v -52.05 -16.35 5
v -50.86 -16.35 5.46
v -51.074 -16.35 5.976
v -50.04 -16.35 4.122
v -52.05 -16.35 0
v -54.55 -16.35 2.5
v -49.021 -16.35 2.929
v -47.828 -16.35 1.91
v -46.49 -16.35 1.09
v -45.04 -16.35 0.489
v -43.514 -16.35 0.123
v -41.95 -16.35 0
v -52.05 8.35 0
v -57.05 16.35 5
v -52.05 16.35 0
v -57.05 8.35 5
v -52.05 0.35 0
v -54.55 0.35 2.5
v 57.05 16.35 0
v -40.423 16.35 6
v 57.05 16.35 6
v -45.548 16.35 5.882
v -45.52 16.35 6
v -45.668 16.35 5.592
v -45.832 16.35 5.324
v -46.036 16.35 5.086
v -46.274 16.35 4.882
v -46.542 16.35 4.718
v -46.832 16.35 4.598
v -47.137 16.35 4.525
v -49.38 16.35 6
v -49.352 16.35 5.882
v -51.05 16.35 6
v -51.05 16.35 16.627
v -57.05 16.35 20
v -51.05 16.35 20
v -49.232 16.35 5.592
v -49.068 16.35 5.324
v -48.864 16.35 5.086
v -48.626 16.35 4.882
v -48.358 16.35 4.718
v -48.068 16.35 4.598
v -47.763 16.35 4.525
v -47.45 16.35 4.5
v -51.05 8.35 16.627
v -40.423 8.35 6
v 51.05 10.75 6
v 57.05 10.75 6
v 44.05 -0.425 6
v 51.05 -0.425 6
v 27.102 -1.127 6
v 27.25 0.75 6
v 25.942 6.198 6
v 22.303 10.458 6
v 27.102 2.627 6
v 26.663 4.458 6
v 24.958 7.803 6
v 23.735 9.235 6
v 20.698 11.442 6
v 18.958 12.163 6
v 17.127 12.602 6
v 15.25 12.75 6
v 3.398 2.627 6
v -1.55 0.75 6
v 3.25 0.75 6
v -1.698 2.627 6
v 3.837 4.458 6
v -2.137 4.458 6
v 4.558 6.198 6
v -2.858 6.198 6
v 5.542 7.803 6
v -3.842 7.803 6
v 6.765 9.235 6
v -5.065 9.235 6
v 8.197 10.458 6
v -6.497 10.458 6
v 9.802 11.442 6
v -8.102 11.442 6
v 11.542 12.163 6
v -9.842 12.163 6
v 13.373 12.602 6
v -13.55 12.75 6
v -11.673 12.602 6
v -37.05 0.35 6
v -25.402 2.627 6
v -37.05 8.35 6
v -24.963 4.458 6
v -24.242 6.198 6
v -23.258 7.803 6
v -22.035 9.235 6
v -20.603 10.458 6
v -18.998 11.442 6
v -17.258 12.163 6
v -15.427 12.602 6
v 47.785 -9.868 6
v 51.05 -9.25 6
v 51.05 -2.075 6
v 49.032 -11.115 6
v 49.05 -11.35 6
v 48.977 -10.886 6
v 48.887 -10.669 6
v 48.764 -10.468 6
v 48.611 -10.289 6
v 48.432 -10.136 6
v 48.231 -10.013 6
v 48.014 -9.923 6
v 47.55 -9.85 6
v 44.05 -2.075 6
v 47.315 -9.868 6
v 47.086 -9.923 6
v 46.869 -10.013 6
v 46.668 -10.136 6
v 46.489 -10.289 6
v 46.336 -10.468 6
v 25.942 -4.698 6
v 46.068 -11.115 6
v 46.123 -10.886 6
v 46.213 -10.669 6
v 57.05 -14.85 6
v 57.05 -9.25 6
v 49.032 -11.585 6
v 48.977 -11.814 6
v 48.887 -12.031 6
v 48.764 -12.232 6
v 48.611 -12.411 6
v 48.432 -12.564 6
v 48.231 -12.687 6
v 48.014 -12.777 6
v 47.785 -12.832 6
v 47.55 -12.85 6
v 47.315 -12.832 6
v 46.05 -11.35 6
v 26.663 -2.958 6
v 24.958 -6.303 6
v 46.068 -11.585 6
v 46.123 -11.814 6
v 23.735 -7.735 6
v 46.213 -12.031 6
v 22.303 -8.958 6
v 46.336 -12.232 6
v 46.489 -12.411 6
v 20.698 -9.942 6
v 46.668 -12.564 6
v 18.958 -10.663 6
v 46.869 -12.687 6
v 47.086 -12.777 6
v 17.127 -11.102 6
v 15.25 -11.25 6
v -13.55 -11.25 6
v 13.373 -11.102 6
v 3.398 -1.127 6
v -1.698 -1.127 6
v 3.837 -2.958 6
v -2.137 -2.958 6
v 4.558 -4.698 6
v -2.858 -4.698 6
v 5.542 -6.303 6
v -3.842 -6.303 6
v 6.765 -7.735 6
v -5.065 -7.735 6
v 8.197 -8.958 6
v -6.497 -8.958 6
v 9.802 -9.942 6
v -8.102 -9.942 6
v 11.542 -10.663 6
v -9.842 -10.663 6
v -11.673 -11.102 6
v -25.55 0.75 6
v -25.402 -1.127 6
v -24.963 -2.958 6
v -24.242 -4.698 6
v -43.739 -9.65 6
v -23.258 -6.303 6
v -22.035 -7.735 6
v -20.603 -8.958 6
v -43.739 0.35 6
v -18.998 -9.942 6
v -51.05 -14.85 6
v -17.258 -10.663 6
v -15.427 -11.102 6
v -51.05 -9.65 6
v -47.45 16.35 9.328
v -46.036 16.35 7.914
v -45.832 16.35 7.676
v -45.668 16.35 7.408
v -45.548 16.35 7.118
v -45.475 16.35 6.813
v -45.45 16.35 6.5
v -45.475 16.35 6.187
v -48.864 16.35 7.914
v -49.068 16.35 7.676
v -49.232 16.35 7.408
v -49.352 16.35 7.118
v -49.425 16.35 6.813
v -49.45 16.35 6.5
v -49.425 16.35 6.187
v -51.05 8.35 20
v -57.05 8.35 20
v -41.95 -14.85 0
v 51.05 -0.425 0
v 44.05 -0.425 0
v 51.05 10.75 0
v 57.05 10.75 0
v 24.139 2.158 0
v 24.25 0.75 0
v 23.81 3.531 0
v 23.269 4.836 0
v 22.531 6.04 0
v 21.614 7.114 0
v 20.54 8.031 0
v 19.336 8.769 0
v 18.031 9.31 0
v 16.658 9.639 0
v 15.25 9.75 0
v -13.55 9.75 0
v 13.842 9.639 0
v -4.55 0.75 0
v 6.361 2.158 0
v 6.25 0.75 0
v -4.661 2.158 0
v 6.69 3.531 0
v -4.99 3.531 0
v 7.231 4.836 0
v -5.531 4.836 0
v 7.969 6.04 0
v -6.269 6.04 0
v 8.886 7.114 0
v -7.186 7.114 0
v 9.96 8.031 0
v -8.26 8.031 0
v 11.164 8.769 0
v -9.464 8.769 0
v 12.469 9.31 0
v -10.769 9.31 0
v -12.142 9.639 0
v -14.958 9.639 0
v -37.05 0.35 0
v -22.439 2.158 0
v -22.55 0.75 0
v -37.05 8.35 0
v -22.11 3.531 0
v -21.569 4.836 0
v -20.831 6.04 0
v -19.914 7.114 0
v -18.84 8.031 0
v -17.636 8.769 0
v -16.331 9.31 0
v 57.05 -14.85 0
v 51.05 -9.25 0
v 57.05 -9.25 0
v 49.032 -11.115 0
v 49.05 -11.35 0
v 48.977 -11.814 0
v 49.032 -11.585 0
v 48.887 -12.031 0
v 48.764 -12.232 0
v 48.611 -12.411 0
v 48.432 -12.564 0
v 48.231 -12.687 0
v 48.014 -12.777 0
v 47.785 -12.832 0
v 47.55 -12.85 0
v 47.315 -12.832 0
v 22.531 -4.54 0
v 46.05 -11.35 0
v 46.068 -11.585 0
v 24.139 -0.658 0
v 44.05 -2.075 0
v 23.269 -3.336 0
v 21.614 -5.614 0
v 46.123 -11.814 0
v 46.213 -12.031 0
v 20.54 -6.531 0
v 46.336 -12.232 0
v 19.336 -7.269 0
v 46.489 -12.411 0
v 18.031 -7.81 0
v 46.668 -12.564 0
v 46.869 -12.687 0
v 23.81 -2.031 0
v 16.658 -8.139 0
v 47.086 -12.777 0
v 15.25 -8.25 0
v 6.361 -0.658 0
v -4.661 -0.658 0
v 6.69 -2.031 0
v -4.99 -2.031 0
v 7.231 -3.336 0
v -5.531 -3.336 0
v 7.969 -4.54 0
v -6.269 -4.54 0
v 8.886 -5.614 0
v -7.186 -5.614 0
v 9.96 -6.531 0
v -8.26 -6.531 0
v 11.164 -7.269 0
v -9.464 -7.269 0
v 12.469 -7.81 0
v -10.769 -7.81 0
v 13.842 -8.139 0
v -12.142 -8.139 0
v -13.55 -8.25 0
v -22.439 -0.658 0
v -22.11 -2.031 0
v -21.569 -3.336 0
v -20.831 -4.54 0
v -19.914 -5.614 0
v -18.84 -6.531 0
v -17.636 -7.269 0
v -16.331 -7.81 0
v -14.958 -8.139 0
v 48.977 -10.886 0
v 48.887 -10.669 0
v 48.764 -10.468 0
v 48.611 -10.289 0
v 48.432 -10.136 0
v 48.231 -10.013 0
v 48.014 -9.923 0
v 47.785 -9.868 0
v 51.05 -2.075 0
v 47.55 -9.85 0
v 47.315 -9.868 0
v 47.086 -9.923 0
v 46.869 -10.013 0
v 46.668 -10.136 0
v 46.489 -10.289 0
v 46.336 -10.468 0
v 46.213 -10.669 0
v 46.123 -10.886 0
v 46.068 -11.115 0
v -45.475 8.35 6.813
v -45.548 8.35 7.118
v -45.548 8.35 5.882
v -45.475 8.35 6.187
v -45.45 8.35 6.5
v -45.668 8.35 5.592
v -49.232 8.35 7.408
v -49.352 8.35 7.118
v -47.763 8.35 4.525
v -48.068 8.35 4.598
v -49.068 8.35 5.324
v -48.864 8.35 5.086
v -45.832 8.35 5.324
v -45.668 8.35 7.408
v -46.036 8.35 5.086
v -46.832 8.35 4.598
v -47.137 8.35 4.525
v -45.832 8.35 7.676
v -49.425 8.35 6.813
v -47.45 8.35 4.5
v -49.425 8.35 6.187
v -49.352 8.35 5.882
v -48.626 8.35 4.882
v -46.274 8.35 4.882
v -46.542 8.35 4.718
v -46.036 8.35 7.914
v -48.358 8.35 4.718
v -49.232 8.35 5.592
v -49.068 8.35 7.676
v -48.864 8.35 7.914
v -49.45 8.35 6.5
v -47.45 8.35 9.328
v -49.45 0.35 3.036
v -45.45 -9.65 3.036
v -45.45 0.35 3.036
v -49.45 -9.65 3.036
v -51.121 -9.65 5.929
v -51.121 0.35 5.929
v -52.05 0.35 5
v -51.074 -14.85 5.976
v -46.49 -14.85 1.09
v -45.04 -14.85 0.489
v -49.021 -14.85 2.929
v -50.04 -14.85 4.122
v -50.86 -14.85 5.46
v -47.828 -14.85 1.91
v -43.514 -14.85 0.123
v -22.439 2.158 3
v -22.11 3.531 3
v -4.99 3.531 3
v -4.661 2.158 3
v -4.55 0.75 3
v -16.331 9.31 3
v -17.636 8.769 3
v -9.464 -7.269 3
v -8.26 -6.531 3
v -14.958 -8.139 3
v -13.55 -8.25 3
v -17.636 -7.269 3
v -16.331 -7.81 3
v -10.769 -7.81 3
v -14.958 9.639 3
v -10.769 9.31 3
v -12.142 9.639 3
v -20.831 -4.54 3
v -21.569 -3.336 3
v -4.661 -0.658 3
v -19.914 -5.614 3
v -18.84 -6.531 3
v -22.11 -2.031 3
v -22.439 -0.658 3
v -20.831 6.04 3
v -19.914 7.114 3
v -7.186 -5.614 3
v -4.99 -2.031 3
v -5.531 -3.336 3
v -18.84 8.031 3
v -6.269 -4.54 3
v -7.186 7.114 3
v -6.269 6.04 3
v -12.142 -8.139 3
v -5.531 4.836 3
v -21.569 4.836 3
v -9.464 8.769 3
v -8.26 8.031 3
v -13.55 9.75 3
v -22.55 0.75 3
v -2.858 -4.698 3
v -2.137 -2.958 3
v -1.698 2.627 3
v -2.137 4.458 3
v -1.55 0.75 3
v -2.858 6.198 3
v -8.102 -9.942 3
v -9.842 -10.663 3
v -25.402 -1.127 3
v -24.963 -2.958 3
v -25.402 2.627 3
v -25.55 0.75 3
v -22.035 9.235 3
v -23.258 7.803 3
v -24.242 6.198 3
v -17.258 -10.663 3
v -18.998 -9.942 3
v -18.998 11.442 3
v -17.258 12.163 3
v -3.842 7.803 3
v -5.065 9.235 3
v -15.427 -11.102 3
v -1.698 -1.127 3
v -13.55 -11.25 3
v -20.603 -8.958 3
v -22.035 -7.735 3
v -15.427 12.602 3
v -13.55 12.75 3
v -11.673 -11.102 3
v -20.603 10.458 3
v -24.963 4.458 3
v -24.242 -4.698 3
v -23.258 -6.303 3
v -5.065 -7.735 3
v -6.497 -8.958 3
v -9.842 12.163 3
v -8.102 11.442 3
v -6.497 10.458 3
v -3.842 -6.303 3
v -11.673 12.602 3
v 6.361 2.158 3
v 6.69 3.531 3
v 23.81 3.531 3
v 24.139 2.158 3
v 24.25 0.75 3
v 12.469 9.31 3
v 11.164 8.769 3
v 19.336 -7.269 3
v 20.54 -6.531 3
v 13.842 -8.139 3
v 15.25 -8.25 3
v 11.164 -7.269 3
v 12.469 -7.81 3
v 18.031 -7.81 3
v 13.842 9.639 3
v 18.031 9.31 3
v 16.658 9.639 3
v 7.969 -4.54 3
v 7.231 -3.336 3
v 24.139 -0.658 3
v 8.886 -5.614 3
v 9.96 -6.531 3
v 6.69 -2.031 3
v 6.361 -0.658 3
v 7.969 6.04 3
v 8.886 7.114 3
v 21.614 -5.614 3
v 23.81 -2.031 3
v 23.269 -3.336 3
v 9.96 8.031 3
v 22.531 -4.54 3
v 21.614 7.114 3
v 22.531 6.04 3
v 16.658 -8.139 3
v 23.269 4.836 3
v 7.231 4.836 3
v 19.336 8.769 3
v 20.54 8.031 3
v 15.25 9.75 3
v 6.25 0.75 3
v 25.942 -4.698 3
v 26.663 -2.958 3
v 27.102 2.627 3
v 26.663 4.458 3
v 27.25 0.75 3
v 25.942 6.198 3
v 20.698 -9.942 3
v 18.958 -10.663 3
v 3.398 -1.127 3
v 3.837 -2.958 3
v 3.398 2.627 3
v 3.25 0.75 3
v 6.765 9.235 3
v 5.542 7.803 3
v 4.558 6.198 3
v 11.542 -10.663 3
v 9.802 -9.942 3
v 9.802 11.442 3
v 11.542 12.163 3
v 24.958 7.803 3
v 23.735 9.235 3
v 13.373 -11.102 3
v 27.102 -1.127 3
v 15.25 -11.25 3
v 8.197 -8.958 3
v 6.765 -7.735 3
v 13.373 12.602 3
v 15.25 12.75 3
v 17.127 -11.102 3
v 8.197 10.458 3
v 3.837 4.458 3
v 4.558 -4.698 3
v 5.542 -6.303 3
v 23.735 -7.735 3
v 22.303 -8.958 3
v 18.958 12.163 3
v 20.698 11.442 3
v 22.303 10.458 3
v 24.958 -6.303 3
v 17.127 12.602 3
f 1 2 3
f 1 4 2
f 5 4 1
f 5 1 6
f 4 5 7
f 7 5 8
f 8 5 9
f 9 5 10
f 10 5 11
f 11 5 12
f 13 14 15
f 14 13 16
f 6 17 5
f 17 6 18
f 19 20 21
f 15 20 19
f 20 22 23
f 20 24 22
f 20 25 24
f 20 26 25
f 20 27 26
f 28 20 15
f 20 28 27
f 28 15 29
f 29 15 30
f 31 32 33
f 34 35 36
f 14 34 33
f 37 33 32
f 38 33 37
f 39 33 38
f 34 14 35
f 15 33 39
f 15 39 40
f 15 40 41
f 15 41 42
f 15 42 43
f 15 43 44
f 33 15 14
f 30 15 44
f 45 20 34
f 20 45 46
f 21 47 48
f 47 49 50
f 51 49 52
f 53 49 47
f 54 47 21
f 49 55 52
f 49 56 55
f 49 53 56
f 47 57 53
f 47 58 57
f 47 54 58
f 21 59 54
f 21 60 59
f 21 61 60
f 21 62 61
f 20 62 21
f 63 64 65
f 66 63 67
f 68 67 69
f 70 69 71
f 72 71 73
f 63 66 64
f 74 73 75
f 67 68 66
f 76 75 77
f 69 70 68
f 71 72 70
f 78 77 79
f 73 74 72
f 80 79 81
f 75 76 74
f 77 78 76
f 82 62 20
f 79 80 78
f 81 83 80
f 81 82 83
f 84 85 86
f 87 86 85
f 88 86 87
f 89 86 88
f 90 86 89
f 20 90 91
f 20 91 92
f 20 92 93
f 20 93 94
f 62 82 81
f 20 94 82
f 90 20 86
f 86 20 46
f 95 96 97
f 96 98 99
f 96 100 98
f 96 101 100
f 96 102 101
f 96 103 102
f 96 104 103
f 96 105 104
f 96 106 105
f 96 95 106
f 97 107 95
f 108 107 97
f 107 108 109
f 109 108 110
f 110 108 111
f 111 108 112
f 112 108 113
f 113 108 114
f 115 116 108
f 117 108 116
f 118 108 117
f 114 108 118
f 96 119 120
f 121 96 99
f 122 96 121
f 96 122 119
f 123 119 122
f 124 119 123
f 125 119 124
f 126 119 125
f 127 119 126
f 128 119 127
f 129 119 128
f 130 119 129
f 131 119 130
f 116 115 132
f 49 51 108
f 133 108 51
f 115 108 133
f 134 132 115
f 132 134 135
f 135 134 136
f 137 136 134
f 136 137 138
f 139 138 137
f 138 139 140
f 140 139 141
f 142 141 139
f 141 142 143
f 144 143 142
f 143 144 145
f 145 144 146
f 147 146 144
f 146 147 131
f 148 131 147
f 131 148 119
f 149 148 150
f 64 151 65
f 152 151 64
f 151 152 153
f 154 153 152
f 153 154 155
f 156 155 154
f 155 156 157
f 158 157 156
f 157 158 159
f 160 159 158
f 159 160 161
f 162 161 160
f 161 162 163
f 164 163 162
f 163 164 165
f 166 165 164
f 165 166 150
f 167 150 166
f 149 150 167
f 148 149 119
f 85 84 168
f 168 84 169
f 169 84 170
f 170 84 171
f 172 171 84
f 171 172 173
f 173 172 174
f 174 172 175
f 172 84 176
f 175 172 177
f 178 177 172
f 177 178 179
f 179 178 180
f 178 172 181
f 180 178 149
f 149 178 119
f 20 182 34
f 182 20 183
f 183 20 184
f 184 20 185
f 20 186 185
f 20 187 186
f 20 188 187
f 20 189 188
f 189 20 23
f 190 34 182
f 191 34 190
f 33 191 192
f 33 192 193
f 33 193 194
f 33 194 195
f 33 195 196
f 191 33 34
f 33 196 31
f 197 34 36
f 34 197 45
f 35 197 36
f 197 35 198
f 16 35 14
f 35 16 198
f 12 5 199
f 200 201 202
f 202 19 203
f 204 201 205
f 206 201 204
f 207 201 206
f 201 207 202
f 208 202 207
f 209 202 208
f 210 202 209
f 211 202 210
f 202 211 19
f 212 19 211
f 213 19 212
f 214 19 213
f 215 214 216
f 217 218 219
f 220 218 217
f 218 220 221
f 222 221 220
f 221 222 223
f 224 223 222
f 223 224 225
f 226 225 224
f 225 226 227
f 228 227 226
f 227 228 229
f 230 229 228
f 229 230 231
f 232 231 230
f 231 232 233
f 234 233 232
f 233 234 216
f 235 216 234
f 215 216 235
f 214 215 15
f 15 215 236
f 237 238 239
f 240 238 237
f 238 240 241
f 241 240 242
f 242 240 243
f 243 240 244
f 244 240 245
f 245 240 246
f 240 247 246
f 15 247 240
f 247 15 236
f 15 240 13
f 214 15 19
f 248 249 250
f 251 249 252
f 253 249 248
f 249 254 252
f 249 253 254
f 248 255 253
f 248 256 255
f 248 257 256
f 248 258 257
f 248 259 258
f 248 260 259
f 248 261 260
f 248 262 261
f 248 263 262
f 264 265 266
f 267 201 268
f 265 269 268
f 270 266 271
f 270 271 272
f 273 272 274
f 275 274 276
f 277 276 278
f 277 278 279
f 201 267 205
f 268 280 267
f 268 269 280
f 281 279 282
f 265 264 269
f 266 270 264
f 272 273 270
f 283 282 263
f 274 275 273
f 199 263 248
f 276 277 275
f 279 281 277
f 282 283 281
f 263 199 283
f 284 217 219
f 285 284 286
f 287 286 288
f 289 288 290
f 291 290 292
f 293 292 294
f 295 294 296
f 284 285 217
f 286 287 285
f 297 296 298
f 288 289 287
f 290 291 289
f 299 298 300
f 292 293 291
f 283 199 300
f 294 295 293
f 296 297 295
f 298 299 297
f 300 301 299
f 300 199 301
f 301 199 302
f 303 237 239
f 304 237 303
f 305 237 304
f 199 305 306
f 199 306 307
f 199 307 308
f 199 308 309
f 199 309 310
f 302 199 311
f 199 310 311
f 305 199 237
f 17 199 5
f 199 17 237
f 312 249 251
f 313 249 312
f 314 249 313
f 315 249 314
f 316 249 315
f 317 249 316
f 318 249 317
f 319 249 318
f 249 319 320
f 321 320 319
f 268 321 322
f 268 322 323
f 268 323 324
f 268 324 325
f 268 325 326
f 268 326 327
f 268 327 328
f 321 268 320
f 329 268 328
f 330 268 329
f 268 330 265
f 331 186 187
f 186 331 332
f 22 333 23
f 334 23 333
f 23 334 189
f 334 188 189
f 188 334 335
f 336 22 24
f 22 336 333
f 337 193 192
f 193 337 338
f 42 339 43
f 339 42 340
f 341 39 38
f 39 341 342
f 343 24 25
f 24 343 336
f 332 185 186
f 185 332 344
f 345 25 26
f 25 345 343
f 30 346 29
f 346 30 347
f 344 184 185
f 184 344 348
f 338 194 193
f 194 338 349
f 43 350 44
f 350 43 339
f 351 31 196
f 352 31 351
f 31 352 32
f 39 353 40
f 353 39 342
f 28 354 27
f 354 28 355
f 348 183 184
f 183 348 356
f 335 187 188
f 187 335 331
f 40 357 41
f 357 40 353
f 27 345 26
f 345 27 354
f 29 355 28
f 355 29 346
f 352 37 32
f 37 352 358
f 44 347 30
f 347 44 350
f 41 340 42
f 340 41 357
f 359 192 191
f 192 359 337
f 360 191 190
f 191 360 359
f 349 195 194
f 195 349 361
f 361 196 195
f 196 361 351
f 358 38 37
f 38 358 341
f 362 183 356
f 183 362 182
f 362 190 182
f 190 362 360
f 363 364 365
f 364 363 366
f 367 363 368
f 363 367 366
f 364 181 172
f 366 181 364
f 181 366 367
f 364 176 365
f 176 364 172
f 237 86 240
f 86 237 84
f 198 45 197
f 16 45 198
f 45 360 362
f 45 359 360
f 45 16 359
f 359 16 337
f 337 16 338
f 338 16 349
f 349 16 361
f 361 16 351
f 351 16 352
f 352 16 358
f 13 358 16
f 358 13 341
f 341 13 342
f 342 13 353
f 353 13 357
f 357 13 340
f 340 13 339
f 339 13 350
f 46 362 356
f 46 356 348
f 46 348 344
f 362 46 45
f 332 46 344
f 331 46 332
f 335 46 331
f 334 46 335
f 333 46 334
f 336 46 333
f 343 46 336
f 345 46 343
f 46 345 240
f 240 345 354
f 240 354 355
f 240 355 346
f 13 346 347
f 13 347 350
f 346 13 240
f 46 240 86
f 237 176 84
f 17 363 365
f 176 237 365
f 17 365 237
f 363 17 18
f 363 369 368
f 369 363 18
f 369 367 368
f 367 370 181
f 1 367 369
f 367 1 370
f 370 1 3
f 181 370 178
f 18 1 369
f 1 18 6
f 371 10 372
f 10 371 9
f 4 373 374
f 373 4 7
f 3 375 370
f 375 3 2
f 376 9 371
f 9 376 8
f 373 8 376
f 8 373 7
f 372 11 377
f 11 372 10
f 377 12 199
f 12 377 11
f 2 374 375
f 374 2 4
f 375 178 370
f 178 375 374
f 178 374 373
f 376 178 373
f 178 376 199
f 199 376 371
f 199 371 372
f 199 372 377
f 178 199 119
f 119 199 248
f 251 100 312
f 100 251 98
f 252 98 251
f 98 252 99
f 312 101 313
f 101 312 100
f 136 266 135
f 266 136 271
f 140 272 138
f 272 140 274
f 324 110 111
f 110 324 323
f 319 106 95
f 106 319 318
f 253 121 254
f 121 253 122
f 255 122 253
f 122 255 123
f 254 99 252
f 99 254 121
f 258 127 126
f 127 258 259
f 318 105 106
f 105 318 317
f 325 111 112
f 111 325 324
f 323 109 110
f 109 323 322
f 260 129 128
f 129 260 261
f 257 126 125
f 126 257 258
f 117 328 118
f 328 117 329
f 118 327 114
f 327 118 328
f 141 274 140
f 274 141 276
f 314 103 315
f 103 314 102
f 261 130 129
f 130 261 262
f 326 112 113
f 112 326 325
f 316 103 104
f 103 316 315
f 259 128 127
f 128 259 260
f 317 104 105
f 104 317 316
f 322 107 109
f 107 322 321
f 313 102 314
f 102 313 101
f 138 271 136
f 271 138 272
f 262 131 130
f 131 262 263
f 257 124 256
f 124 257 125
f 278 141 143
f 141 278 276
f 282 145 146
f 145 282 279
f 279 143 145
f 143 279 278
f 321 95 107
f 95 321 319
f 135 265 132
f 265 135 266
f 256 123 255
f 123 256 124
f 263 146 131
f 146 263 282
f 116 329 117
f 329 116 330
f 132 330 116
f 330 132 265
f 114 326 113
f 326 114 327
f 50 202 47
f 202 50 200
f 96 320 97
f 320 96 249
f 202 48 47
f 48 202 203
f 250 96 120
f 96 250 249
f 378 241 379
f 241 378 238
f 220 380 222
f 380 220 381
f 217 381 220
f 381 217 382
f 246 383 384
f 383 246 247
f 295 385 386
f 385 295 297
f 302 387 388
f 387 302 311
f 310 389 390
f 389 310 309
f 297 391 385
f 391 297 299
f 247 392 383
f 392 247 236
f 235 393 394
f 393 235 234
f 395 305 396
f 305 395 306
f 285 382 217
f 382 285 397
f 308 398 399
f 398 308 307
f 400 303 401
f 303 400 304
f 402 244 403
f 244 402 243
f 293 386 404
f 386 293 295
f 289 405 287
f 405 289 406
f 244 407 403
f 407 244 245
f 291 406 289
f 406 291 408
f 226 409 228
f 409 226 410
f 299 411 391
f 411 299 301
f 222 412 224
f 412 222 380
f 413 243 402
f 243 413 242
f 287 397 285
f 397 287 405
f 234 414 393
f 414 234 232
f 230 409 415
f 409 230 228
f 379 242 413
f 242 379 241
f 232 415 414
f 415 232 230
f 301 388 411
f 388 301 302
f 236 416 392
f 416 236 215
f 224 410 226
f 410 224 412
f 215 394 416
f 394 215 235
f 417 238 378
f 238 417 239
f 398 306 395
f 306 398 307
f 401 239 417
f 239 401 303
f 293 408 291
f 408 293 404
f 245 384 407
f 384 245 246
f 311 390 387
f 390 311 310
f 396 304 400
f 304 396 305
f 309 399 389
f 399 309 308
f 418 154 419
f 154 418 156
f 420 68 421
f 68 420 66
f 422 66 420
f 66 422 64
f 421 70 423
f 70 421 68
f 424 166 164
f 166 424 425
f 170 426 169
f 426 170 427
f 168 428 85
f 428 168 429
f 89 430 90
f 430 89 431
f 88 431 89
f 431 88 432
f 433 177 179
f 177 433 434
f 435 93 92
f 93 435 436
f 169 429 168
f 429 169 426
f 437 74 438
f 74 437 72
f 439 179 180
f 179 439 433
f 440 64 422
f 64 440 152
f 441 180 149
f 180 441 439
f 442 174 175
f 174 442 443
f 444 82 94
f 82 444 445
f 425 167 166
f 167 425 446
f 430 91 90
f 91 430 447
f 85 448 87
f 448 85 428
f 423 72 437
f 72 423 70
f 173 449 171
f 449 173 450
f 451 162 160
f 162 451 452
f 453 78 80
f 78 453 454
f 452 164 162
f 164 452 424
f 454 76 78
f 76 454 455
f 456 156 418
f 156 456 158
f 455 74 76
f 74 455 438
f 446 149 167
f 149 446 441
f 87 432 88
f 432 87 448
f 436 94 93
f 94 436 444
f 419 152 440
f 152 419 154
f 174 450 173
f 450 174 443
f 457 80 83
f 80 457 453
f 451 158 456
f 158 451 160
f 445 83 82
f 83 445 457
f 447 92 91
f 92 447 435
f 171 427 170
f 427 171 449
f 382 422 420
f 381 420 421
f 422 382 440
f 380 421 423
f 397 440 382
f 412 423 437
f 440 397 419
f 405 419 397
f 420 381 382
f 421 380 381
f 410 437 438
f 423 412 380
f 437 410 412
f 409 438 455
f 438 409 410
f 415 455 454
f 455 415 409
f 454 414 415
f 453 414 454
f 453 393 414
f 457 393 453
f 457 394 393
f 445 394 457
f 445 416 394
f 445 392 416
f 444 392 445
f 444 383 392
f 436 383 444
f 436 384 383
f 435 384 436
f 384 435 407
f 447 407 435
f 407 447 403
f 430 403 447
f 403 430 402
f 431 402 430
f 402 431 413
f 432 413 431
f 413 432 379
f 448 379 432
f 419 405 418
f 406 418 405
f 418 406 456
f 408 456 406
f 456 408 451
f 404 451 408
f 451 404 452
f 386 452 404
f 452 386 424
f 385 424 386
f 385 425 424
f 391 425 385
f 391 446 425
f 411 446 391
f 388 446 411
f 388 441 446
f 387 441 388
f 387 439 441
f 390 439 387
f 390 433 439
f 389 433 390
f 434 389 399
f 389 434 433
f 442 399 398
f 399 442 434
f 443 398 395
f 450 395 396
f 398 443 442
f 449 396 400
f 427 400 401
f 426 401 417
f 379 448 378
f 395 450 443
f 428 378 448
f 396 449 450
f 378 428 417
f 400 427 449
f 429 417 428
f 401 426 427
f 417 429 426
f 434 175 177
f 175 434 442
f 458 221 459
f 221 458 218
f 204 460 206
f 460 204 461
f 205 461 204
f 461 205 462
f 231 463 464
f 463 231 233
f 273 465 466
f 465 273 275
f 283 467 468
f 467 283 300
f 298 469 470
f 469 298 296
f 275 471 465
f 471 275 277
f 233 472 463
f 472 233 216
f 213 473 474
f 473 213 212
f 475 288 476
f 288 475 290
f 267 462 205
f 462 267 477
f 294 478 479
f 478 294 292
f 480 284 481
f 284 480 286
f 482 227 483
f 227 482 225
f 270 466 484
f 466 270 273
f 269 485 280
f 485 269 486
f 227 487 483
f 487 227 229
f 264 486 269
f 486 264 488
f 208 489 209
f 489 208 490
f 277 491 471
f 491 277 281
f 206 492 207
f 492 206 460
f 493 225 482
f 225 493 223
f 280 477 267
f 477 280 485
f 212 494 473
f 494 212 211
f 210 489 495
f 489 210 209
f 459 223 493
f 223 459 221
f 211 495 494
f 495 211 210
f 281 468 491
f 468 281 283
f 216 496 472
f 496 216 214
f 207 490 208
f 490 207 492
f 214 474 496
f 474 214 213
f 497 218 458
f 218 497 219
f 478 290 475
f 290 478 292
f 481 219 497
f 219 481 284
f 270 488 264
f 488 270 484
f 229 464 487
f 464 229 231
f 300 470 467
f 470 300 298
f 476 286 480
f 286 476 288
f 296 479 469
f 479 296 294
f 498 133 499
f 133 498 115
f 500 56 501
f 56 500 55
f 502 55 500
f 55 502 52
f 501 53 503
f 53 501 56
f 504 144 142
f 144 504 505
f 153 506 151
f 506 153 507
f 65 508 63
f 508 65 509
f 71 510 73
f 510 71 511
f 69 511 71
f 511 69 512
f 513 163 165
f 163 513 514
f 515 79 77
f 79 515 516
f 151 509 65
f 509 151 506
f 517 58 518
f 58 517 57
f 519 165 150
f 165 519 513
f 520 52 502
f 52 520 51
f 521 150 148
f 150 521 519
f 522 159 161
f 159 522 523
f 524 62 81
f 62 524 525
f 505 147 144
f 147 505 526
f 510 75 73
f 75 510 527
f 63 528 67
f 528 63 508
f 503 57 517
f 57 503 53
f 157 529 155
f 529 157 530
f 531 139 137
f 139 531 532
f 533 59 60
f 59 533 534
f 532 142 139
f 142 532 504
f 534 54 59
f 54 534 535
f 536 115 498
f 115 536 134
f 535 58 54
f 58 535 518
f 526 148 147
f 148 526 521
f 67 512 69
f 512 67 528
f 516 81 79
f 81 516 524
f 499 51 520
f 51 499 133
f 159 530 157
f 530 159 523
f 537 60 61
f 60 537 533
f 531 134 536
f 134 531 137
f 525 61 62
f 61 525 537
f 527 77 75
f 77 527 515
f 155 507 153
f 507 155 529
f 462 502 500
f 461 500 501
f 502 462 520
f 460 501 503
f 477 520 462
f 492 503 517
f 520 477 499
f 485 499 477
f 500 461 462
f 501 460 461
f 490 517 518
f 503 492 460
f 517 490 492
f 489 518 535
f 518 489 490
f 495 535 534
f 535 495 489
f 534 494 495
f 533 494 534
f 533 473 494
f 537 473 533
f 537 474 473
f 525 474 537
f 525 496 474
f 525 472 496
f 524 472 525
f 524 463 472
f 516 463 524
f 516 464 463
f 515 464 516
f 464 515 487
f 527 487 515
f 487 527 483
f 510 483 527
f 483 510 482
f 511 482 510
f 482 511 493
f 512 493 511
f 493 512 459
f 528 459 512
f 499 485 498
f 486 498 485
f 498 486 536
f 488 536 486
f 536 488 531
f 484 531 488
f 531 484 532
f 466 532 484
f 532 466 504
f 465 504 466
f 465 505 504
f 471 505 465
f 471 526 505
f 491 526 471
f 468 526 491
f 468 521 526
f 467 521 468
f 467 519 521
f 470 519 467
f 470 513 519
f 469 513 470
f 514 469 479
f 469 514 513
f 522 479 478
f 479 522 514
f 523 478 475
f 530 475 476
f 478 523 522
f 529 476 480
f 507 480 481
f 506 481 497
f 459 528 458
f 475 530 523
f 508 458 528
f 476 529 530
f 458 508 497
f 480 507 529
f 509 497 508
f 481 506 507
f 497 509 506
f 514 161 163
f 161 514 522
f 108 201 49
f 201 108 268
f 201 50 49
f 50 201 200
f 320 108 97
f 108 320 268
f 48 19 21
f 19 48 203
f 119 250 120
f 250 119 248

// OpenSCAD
// file: _ittybox.scad
include <_constants.scad>

module panel(wall_thickness, side=false) {
	bolt_x = side ? bolt_offset_y : bolt_offset_x;
	bolt_z = side ? bolt_offset_x : bolt_offset_y;
	width = side ? panel_depth : panel_width;
	overlap_cutout_potition = side ? end_corner_height : -end_corner_height;
	overlap_cutout_size = side ? end_corner_height*2 : end_corner_height;

	difference() {
		union() {
			// Main panel
			translate([0, 0, wall_thickness/2]) {
				cube([width - corner_radius*2, height, wall_thickness], center=true);
			}

			for (x = [-1, 1]) {
				// Rounded corner
				translate([x*(width/2 - corner_radius), 0, corner_radius]) {
					r = corner_radius;
					rotate([90, 0, 0]) {
						intersection() {
							cylinder(height, r=r, center=true, $fn=4);
							mirror([x > 0 ? 1 : 0, 0, 0]) translate([0, 0, -height/2]) {
								linear_extrude(height=height) polygon([[-r, r], [-r, -r], [r, -r]]);
							}
						}
					}
				}
				overlap_length = corner_overlap - corner_radius;

				// Overlap side
				translate([x*(width/2 - wall_thickness/2), 0, corner_radius + overlap_length/2]) {
					cube([wall_thickness, height, overlap_length], center=true);
				}

				// Corner chamfer
				translate([x*(width/2), height/2 - end_corner_height*2, 0]) {
					mirror([x > 0 ? 1 : 0, 0, 0])
					intersection() {
						rotate([0, 45, 0]) cube([corner_chamfer*2, height*2, corner_chamfer*2], center=true);
						translate([wall_thickness, 0, wall_thickness]) {
							cube([width/2, end_corner_height*2, corner_overlap - wall_thickness], center=false);
						}
					}
				}
			}

			if (side) {
				// Plexi support
				support_height = (panel_width - plexi_width)/2 + 4;
				support_depth = plexi_thickness + 5;
				translate([0, -height/2 + plexi_thickness/2, support_height/2]) {
					cube([width - corner_radius*2, support_depth, support_height], center=true);
				}
			}
		}

		for (x = [-1, 1]) {
			// Bolt hole
			translate([x*(width/2 - bolt_x), height/2 - end_corner_height*2, bolt_z]) {
				rotate([-90, 0, 0]) cylinder(height, d=bolt_diameter, center=false);
				rotate([0, -45, 0]) cube([bolt_diameter/2, height, bolt_diameter/2], center=false);
				bolt_depression = bolt_nut_thickness/2;
				rotate([90, 0, 0]) cylinder(bolt_nut_clearance, d=bolt_nut_width, center=false, $fn=6);
				mirror([0, 1, 0]) translate([-bolt_nut_width/2, 0, 0]) cube([bolt_nut_width, bolt_nut_clearance, bolt_nut_width], center=false);
			}

			// Overlap cutout
			translate([x*(width/2), height/2 + overlap_cutout_potition - overlap_cutout_size/2, 0]) {
				cube([corner_overlap*2, overlap_cutout_size, corner_overlap*4], center=true);
			}

			// Diagonal corner cut
			translate([x*(width/2), height/2 - end_corner_height*2, 0]) {
				mirror([0, 1, 0]) rotate([0, -45, 0]) cube([width, height, width], center=false);
			}
		}
	}
}

module plexi_hole() {
	hull() {
		translate([
			-plexi_width/2 + plexi_hole_offset_x + plexi_hole_diameter/2,
			-plexi_depth/2 + plexi_hole_offset_y + plexi_hole_diameter/2,
			0,
		]) {
			cylinder(plexi_thickness*2, d=plexi_hole_diameter, center=true);
			translate([0, plexi_hole_length - plexi_hole_diameter, 0]) cylinder(plexi_thickness*2, d=plexi_hole_diameter, center=true);
		}
	}
}

module plexi() {
	difference() {
		translate([0, 0, plexi_thickness/2]) {
			minkowski() {
				cube([
					plexi_width - plexi_corner_radius*2,
					plexi_depth - plexi_corner_radius*2,
					plexi_thickness/2,
				], center=true);
				cylinder(plexi_thickness/2, r=plexi_corner_radius, center=true);
			}
		}
		// plexi_hole();
		// mirror([0, 1, 0]) plexi_hole();
		// mirror([1, 0, 0]) plexi_hole();
		// rotate([0, 0, 180]) plexi_hole();
	}
}

module end_panel(wall_thickness) {
	difference() {
		panel(wall_thickness, side=false);
		translate([0, -height/2, panel_depth/2]) rotate([-90, 0, 0]) plexi();
	}
}

module side_panel(wall_thickness) {
	difference() {
		panel(wall_thickness, side=true);
		translate([0, -height/2, panel_width/2]) rotate([-90, 90, 0]) plexi();
	}
}

module button_hole() {
	cylinder(button_panel_thickness*3, d=button_diameter, center=true);
	translate([0, 0, button_panel_thickness])
		cylinder(button_panel_thickness*2, d=button_tab_diameter, center=false);
}

module back_panel() {
	wall_thickness = 6;
	difference() {
		end_panel(wall_thickness);

		// USB port panel
		translate([0, height/2 - usb_panel_board_pos_y, 0]) {
			cube([usb_panel_width, usb_panel_board_thickness, wall_thickness*3], center=true);
		}
		translate([0, height/2 - usb_panel_height/2, 0]) {
			cube([usb_panel_inner_width, usb_panel_inner_height, wall_thickness*3], center=true);
			screw_x = usb_panel_width/2 - usb_panel_hole_offset;
			screw_y = usb_panel_height/2 - usb_panel_hole_offset;
			for (xy = [ [screw_x, screw_y], [-screw_x, -screw_y] ]) {
				translate([each xy, 0]) {
					cylinder(wall_thickness*3, d=usb_panel_hole_diameter, center=true);
				}
			}
		}

		// Button holes
		translate([0, height/2 - usb_panel_height/2, 0]) {
			offset = usb_panel_width/2;
			for (x = [
				-(offset + button_spacing*2),
				-(offset + button_spacing),
				(offset + button_spacing),
				(offset + button_spacing*2),
			]) {
				translate([x, 0, 0]) {
					button_hole();
				}
			}
		}
	}
}

module front_panel() {
	end_panel(4);
}

module left_panel() {
	side_panel(4);
}

module right_panel() {
	wall_thickness = 4;
	switch_offset_x = panel_depth - 43;
	switch_offset_y = 8;
	difference() {
		side_panel(wall_thickness);
		translate([-panel_depth/2 + switch_offset_x, height/2 - switch_offset_y, 0]) {
			cube([12, 10, wall_thickness*3], center=true);
		}
	}
}

module panel_joint() {
	joint_inner = 6;
	joint_outer = 9;
	joint_length = 6;
	spacing = (joint_inner + joint_outer)/2;
	translate([-joint_length/2, 0, -corner_overlap])
	linear_extrude(height=corner_overlap*3)
	polygon([
		[0, height],
		[-panel_width, height],
		[-panel_width, -height],
		[0, -height],
		[0, -spacing - joint_inner/2],
		[joint_length, -spacing - joint_outer/2],
		[joint_length, -spacing + joint_outer/2],
		[0, -spacing + joint_inner/2],
		[0, spacing - joint_inner/2],
		[joint_length, spacing - joint_outer/2],
		[joint_length, spacing + joint_outer/2],
		[0, spacing + joint_inner/2],
	]);
}

module panel_split() {
  translate([0, -height, -corner_overlap*2])
  mirror([1, 0, 0])
  cube([panel_width, height*2, corner_overlap*4]);
}

back_panel();
translate([0, height*1.5, 0]) front_panel();
translate([0, height*-1.5, 0]) right_panel();
translate([0, height*-3, 0]) left_panel();
// file: _constants.scad
$fn = 40;

// AllFightSticks 9.5" Button Panel - Stickless
// https://allfightsticks.com/collections/9-5-enclosures/products/9-5-button-panel?variant=21327143141455
panel_width = 228.2;
panel_depth = 171.5;
bolt_offset_x = 9.6; // distance to center of hole
bolt_offset_y = 6.5; // distance to center of hole
corner_radius = 5;

// FocusAttack Blank Plexi Cover for AllFightSticks 9.5" Solid Bottom Panel
// https://focusattack.com/blank-plexi-cover-for-allfightsticks-9-5-solid-bottom-panel/
plexi_width = 218;
plexi_depth = panel_depth;
plexi_thickness = 1.5;
plexi_hole_offset_x = 11.1; // distance to edge
plexi_hole_offset_y = 8.85; // distance to edge
plexi_hole_diameter = 8;
plexi_hole_length = 14;
plexi_corner_radius = 10;

// Sanwa SDM-18 buttons
// https://paradisearcadeshop.com/home/controls/buttons/sanwa/358-sanwa-sdm-series
button_diameter = 18;
button_tab_diameter = 24;
button_panel_thickness = 3;

// Brook Wireless Fighting Board
// https://www.brookaccessory.com/detail/41130595/
usb_panel_width = 26;
usb_panel_height = 31.2;
usb_panel_depth = 1.6;
usb_panel_hole_offset = 3.5; // from top/side edge
usb_panel_hole_diameter = 3; // M3
usb_panel_board_thickness = 1.65; // horizontal board
usb_panel_board_pos_y = 17.6; // from top
usb_panel_inner_width = 12; // USB connector housing
usb_panel_inner_height = 20; // USB connector housing/3.5mm jack

// M4 x 20mm internal hex button-head screw
bolt_diameter = 4;
bolt_length = 20;
bolt_nut_thickness = 3.2;
bolt_nut_width = 8; // outer
bolt_nut_clearance = 10;

height = usb_panel_height + plexi_thickness;
corner_overlap = 20;
end_corner_height = 8;
corner_chamfer = 16;
button_spacing = button_tab_diameter*1.2;
joint_offset = 0.5; // Accounts for extra length added by joint
// main file
include <_constants.scad>
use <_ittybox.scad>;

translate([panel_width/4, 0, 0])
intersection() {
  back_panel();
  panel_split();
}
